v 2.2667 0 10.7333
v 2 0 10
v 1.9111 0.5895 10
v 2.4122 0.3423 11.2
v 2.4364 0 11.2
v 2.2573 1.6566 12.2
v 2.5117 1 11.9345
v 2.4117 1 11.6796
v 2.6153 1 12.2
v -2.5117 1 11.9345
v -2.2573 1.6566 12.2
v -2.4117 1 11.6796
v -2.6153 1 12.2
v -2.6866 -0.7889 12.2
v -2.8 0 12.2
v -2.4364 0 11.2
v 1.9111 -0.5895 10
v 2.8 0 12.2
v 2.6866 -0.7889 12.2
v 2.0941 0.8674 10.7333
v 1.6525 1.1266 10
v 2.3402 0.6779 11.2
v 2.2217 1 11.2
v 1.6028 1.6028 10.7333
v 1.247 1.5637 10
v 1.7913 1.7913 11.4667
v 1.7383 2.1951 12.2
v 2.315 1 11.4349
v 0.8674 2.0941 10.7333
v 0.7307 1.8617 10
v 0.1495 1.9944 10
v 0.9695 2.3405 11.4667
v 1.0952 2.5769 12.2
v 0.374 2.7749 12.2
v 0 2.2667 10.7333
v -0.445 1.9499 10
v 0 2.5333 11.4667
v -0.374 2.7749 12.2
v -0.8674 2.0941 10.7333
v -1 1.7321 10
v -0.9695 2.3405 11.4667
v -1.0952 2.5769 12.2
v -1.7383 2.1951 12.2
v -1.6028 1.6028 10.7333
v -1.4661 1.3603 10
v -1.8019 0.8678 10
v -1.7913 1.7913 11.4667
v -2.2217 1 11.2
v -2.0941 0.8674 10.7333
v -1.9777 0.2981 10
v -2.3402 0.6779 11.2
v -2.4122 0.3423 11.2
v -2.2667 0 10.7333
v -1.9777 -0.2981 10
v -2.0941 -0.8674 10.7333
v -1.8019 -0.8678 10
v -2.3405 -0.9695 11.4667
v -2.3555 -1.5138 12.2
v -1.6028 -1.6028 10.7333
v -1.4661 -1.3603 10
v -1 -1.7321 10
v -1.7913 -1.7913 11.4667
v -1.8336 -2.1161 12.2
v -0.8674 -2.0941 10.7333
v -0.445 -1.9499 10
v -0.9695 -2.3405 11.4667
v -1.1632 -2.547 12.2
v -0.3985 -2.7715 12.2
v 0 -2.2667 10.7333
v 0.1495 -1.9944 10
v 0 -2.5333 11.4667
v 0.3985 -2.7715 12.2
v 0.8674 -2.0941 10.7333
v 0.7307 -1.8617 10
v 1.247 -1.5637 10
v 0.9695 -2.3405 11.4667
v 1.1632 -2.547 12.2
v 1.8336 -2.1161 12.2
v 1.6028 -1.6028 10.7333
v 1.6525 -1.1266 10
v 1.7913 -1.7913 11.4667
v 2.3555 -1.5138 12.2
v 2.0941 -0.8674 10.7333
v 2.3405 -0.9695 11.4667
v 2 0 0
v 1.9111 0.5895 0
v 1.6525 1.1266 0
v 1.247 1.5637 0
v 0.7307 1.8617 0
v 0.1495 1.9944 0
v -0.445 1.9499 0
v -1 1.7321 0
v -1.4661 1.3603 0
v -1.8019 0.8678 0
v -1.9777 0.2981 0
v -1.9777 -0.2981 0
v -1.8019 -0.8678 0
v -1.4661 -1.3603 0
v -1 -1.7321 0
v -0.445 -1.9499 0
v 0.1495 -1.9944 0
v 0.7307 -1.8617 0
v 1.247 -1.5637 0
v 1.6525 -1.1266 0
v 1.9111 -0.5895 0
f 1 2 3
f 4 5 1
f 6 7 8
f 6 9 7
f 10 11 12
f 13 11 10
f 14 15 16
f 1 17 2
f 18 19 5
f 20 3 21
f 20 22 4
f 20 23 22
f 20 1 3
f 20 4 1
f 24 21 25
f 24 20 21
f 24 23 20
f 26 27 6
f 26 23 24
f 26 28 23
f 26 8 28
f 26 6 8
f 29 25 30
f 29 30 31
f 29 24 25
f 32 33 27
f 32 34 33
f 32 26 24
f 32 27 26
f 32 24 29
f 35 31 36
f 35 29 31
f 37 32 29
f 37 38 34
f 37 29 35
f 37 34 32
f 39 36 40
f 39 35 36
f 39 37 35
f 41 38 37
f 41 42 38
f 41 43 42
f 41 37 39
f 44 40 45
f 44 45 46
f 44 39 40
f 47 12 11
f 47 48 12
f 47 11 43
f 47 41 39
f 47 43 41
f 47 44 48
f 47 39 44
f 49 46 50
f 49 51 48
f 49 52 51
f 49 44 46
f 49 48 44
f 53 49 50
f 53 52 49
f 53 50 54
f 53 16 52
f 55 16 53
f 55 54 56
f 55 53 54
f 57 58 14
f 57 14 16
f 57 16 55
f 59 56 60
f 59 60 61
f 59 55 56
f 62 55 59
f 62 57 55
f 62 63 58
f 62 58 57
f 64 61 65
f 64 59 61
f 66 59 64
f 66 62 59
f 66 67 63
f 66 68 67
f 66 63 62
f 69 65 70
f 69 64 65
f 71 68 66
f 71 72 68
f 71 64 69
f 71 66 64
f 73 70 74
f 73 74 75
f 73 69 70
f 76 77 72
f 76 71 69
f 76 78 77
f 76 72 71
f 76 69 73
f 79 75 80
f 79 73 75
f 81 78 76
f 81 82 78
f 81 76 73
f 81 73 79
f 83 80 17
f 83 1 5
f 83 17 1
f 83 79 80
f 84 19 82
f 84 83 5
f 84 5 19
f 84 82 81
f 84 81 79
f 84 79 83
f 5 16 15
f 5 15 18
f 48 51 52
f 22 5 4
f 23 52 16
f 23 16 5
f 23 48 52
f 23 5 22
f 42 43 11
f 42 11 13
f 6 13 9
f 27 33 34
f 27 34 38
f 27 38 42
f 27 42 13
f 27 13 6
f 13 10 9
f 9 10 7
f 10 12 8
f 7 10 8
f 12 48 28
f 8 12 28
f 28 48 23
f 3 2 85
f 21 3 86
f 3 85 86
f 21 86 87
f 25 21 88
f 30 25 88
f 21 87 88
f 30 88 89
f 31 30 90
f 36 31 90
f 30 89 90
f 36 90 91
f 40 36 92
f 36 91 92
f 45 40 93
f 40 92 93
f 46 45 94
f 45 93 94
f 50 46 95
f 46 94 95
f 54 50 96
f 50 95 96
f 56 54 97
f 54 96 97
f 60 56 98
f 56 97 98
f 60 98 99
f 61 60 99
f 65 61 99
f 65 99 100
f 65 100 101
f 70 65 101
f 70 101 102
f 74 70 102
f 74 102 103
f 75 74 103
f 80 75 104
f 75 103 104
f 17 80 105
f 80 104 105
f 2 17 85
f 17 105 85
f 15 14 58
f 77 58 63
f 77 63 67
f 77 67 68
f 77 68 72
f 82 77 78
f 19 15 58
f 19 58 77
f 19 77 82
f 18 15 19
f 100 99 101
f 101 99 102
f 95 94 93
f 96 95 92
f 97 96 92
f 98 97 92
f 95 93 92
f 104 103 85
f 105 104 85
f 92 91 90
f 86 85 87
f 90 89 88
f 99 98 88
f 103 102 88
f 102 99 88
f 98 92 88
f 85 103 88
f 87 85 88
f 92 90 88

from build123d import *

# Parameters (mm, degrees)
BOX_W          = 10
BOX_H          = 1
BOX_DEPTH      = 2
CYLINDER_R     = 2
CYLINDER_DEPTH = 10


with BuildPart() as cube:
    # Box → Box (new body)
    with BuildSketch(Plane(origin=(-5, 0, 11.2), x_dir=(1, 0, 0), z_dir=(0, 0, 1))):
        with Locations((5, 0.5)):
            Rectangle(BOX_W, BOX_H)
    extrude(amount=BOX_DEPTH)


with BuildPart() as cut:
    # Cone → Cone (revolve)
    with BuildSketch(Plane(origin=(0, 0, 10), x_dir=(1, 0, 0), z_dir=(0, -1, 0))):
        Polygon((0, 0), (2, 0), (2.8, 2.2), (0, 2.2), align=None)
    revolve(axis=Axis((0, 0, 10), (0, 0, 1)))

    # Cut: cut Cube
    add(cube.part, mode=Mode.SUBTRACT)


with BuildPart() as fusion:
    # Cylinder → Cylinder (new body)
    with BuildSketch(Plane.XY):
        Circle(CYLINDER_R)
    extrude(amount=CYLINDER_DEPTH)

    # Fusion: union Cut
    add(cut.part)


solid = fusion.part
